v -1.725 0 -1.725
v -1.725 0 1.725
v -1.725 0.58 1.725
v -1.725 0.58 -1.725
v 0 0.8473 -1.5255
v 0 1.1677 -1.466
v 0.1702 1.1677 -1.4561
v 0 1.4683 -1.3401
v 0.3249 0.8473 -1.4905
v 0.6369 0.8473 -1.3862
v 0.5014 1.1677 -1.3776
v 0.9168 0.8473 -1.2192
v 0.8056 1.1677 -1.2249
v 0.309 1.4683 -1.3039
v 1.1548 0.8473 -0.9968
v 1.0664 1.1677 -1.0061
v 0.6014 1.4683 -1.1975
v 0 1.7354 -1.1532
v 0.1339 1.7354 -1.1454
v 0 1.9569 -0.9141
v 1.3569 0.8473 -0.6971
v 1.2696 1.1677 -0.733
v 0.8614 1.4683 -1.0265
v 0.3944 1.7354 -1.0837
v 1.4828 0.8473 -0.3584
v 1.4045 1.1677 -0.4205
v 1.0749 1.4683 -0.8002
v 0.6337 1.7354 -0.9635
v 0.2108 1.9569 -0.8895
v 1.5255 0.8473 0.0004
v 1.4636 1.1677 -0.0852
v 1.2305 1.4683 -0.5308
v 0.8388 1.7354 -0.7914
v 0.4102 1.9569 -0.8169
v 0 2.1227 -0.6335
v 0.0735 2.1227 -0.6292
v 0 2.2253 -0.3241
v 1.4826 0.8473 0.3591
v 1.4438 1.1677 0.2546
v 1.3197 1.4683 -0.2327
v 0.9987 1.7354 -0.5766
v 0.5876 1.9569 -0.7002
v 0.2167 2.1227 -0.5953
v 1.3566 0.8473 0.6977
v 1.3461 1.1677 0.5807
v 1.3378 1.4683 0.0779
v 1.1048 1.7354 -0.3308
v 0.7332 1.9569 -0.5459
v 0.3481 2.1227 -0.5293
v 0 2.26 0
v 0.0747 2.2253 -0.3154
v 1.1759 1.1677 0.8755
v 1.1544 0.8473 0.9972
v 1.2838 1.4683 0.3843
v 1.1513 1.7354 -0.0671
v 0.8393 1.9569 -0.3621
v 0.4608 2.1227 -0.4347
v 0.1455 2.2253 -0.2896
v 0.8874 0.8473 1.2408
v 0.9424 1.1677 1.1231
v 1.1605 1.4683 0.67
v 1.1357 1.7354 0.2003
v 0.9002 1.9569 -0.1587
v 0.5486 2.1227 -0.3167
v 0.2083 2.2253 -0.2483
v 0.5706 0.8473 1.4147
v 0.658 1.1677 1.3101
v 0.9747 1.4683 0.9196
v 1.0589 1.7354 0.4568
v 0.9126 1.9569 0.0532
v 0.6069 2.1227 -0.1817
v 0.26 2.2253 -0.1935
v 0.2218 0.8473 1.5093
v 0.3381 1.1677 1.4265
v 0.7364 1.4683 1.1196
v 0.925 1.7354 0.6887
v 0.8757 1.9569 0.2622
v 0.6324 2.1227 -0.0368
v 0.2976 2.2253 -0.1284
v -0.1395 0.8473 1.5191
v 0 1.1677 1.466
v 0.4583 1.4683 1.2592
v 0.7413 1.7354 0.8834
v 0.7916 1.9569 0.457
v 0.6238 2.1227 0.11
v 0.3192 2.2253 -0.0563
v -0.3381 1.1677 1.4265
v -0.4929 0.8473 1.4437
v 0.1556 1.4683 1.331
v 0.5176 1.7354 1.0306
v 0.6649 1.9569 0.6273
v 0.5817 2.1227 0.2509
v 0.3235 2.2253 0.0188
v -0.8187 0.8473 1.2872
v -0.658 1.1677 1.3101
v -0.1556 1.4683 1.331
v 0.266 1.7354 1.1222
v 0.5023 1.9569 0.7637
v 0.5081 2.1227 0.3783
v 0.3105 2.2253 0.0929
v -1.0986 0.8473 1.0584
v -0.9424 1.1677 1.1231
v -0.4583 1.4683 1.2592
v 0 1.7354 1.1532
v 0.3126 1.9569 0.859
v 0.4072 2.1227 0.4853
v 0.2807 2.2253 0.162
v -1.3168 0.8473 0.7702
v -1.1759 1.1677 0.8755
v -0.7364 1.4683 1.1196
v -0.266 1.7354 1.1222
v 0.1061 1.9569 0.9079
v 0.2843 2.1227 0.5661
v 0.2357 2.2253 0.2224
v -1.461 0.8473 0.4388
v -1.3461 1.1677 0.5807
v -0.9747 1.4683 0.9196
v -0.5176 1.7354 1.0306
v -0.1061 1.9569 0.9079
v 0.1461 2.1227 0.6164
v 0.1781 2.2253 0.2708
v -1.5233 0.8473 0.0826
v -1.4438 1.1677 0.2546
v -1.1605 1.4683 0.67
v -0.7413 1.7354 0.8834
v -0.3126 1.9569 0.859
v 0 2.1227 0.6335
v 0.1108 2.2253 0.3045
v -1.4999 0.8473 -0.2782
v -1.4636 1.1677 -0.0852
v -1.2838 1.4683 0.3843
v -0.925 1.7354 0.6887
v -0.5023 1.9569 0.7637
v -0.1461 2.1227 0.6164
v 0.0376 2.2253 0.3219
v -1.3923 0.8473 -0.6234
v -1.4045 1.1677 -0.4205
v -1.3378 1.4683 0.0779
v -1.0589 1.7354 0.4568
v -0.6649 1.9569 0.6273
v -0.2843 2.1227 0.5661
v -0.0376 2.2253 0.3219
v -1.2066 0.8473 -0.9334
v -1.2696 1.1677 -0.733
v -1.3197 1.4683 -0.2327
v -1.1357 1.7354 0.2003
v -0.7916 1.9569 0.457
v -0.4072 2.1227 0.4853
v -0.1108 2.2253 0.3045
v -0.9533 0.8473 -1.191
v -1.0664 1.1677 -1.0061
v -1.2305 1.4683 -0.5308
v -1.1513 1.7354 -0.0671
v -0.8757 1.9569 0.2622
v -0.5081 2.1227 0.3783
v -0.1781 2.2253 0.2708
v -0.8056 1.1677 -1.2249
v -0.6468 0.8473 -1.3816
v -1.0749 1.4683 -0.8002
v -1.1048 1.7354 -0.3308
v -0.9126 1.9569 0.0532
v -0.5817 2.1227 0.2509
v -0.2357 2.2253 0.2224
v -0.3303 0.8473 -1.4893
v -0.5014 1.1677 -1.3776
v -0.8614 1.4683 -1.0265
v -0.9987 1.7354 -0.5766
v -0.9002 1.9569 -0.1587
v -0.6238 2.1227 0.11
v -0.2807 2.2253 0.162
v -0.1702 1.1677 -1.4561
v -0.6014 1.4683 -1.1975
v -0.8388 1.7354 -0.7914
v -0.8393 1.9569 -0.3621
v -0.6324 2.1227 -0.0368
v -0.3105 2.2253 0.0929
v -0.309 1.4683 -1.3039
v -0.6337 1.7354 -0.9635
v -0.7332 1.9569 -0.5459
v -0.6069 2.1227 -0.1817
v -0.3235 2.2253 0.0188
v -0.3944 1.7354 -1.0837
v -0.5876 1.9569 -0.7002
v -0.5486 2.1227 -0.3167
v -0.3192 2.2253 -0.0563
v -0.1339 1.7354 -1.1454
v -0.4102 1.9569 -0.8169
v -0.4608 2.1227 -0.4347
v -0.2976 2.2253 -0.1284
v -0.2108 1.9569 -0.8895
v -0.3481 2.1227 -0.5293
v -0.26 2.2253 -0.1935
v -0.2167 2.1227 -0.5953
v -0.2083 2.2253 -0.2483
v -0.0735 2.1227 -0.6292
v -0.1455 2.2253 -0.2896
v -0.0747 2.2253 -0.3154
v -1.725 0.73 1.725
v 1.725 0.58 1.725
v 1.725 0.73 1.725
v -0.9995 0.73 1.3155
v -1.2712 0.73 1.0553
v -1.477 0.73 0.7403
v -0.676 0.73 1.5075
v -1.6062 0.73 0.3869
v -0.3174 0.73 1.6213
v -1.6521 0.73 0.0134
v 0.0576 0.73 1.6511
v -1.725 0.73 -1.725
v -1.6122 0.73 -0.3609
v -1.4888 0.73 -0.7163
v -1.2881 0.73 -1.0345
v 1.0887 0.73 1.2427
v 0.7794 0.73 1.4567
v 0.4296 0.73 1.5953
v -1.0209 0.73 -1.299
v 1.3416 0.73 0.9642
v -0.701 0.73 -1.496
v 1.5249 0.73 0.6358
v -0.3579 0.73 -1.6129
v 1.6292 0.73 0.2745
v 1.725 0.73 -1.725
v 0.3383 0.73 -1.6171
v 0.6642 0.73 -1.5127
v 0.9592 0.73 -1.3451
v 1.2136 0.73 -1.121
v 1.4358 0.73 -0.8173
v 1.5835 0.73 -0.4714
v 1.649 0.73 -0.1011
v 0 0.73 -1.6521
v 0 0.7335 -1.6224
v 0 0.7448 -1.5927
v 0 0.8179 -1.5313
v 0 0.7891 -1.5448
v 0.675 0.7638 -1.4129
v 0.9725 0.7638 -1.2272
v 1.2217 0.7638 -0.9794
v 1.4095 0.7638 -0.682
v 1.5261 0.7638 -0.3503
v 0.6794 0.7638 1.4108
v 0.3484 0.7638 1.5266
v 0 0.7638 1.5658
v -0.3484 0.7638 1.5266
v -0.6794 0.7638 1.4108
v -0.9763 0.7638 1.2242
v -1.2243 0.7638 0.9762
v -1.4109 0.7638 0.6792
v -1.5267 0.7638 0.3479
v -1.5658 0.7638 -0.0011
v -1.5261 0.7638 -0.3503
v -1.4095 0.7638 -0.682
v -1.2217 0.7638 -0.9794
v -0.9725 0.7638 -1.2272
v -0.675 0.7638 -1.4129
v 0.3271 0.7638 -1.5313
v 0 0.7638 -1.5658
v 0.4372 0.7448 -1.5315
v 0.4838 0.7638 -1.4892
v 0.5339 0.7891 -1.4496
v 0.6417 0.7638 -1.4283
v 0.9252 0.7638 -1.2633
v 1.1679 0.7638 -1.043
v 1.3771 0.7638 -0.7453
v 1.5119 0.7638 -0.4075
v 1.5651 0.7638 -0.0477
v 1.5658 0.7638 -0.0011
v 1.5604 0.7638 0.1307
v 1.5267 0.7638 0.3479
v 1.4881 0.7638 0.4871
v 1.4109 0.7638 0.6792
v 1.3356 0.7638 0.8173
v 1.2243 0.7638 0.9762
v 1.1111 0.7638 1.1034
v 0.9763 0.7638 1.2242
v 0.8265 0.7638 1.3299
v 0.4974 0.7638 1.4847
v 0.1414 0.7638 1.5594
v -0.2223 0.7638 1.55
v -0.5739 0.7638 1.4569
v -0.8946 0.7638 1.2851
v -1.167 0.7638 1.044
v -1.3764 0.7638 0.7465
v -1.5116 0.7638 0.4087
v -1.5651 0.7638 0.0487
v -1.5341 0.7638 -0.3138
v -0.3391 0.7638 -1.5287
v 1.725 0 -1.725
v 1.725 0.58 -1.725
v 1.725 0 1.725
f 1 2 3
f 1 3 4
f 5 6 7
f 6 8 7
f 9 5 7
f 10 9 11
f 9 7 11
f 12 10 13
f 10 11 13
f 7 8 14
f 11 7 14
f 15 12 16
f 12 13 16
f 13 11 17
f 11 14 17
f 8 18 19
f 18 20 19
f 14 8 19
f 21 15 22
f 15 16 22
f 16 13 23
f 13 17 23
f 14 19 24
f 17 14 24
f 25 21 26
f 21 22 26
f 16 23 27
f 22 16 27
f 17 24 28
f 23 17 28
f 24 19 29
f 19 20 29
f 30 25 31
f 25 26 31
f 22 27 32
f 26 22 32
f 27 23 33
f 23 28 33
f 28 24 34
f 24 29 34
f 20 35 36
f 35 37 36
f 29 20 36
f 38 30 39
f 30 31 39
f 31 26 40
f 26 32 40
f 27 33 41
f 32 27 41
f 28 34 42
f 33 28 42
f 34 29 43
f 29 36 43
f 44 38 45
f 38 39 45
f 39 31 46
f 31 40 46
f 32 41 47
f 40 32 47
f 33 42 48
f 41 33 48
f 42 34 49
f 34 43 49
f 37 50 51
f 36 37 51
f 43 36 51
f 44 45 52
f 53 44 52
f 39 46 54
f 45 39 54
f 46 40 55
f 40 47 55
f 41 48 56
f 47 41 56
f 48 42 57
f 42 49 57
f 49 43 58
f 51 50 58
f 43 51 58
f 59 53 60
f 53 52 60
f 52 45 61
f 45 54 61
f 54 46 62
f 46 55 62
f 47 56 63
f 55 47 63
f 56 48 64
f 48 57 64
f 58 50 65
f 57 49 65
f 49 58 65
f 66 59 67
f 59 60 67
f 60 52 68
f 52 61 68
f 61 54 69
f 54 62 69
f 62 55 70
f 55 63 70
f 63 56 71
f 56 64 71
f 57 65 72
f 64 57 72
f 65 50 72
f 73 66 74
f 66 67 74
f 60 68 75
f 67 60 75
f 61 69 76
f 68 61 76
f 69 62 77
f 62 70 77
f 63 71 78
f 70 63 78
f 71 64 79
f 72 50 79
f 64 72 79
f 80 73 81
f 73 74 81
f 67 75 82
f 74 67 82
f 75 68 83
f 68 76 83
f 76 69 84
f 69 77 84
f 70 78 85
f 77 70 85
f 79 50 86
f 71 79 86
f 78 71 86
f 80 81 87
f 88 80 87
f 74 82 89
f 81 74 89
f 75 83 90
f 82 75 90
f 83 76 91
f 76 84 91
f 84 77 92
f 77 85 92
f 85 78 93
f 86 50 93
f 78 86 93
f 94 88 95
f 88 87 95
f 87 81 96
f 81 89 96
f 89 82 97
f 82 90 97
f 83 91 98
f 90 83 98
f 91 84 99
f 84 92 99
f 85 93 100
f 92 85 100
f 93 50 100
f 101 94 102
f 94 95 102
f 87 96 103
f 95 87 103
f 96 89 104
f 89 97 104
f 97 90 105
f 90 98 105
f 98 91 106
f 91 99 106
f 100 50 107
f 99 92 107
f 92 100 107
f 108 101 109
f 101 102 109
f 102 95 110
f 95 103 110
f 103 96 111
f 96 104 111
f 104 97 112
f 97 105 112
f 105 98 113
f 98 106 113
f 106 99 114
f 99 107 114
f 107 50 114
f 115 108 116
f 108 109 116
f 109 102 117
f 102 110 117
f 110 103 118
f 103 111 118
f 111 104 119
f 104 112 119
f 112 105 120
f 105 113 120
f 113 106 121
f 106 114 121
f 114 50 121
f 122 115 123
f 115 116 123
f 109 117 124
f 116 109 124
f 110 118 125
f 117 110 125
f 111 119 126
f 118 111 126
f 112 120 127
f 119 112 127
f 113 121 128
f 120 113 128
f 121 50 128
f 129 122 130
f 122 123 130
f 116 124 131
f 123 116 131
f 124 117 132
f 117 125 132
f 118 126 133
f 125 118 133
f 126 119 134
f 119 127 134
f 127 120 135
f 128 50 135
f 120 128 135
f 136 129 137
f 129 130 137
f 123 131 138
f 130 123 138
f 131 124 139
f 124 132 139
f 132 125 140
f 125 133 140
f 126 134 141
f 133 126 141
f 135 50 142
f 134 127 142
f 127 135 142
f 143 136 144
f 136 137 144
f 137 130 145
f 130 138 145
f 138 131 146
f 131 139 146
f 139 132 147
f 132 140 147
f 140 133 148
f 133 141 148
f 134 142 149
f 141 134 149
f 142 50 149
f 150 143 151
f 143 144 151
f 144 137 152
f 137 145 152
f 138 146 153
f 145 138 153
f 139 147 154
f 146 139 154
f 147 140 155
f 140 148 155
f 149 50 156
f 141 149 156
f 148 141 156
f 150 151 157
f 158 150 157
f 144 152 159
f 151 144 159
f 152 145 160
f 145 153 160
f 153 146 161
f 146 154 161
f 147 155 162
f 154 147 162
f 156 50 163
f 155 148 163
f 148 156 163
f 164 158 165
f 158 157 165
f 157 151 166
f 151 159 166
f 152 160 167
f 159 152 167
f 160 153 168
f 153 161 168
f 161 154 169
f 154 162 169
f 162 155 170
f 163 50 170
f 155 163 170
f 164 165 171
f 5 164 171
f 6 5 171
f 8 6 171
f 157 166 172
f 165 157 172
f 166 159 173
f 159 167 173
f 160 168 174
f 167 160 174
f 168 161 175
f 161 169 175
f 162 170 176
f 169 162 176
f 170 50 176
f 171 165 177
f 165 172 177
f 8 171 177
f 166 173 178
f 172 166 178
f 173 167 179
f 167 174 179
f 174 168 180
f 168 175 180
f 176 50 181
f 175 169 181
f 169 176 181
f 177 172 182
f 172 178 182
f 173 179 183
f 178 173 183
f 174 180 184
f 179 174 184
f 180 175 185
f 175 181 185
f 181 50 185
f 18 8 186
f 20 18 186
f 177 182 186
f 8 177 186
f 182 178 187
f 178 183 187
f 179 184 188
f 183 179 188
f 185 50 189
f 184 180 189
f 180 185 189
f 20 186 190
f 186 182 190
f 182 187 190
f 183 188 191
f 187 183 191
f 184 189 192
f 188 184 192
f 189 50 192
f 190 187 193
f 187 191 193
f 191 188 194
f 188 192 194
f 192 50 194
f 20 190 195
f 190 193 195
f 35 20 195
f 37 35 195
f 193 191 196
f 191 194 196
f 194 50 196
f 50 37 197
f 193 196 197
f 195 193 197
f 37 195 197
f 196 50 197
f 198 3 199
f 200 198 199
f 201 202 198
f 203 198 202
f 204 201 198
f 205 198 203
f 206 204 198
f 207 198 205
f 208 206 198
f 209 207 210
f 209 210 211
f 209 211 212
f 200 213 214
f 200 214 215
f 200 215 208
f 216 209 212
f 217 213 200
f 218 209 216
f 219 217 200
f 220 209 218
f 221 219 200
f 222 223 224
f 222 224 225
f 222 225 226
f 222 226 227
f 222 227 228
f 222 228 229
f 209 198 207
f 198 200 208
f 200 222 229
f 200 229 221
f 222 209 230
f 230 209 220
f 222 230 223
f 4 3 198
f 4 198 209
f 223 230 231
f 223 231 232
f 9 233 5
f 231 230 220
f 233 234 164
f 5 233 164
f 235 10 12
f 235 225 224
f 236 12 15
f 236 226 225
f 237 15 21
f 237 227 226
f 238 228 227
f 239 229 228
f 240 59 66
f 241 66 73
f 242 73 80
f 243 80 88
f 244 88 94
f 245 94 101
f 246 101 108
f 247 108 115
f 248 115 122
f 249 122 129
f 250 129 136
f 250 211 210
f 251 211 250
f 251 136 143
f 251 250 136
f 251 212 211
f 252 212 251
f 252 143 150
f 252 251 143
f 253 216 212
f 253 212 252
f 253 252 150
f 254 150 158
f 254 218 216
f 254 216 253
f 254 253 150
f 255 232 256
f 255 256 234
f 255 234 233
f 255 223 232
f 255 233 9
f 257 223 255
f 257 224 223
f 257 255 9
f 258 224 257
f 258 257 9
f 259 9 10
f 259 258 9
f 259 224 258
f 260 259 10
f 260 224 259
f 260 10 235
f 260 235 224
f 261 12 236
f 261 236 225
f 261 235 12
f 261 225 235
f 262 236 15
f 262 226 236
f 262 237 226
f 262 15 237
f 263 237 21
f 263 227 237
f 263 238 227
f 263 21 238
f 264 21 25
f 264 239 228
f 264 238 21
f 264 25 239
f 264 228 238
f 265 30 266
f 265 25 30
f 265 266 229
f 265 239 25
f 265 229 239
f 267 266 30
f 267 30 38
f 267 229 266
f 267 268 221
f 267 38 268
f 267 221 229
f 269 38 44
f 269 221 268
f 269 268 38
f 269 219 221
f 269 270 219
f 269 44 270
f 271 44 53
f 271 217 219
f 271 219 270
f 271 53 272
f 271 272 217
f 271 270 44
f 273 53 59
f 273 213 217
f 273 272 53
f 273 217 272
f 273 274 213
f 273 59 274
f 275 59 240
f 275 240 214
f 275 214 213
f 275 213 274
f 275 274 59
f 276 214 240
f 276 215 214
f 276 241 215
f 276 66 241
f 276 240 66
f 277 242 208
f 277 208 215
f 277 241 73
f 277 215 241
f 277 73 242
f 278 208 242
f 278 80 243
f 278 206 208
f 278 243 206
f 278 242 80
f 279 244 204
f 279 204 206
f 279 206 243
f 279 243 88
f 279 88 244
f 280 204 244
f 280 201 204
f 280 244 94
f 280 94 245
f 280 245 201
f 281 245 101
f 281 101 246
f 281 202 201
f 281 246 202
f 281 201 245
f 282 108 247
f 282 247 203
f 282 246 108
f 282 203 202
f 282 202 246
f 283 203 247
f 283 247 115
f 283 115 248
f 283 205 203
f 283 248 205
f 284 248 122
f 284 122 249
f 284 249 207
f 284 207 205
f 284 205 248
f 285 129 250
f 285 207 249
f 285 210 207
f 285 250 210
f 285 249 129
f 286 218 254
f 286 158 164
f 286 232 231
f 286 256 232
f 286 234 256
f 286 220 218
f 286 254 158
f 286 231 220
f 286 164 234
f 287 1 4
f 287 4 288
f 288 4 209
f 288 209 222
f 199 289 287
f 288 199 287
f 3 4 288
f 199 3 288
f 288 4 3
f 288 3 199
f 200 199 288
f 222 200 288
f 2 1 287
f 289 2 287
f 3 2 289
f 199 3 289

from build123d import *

# Parameters (mm, degrees)
SKETCH1_W           = 3.45
SKETCH1_H           = 3.45
BOSS_EXTRUDE1_DEPTH = 0.58
SKETCH2_W           = 3.45
SKETCH2_H           = 3.45
BOSS_EXTRUDE2_DEPTH = 0.15
FILLET1_R           = 0.127


with BuildPart() as part:
    # Sketch1 → Boss-Extrude1 (new body)
    with BuildSketch(Plane(origin=(0, 0, 0), x_dir=(1, 0, 0), z_dir=(0, 1, 0))):
        Rectangle(SKETCH1_W, SKETCH1_H)
    extrude(amount=BOSS_EXTRUDE1_DEPTH)


with BuildPart() as body_2:
    # Sketch2 → Boss-Extrude2 (new body)
    with BuildSketch(Plane(origin=(0, 0.58, 0), x_dir=(1, 0, 0), z_dir=(0, 1, 0))):
        Rectangle(SKETCH2_W, SKETCH2_H)
    extrude(amount=BOSS_EXTRUDE2_DEPTH)

    # Sketch3 → Revolve1 (revolve)
    with BuildSketch(Plane(origin=(0, 0, 0), x_dir=(0, 0, -1), z_dir=(1, 0, 0))):
        with BuildLine():
            Line((0, 0.73), (1.53, 0.73))
            ThreePointArc((1.53, 0.73), (1.081873375, 1.811873375), (0, 2.26))
            Line((0, 2.26), (0, 0.73))
        make_face()
    revolve(axis=Axis((0, 2.26, 0), (0, -1, 0)))

    # Fillet1
    fillet1_edges = [body_2.edges().sort_by_distance(p)[0] for p in [
        (0, 0.73, 1.53),
    ]]
    fillet(fillet1_edges, radius=FILLET1_R)


solid = Compound([part.part, body_2.part])
